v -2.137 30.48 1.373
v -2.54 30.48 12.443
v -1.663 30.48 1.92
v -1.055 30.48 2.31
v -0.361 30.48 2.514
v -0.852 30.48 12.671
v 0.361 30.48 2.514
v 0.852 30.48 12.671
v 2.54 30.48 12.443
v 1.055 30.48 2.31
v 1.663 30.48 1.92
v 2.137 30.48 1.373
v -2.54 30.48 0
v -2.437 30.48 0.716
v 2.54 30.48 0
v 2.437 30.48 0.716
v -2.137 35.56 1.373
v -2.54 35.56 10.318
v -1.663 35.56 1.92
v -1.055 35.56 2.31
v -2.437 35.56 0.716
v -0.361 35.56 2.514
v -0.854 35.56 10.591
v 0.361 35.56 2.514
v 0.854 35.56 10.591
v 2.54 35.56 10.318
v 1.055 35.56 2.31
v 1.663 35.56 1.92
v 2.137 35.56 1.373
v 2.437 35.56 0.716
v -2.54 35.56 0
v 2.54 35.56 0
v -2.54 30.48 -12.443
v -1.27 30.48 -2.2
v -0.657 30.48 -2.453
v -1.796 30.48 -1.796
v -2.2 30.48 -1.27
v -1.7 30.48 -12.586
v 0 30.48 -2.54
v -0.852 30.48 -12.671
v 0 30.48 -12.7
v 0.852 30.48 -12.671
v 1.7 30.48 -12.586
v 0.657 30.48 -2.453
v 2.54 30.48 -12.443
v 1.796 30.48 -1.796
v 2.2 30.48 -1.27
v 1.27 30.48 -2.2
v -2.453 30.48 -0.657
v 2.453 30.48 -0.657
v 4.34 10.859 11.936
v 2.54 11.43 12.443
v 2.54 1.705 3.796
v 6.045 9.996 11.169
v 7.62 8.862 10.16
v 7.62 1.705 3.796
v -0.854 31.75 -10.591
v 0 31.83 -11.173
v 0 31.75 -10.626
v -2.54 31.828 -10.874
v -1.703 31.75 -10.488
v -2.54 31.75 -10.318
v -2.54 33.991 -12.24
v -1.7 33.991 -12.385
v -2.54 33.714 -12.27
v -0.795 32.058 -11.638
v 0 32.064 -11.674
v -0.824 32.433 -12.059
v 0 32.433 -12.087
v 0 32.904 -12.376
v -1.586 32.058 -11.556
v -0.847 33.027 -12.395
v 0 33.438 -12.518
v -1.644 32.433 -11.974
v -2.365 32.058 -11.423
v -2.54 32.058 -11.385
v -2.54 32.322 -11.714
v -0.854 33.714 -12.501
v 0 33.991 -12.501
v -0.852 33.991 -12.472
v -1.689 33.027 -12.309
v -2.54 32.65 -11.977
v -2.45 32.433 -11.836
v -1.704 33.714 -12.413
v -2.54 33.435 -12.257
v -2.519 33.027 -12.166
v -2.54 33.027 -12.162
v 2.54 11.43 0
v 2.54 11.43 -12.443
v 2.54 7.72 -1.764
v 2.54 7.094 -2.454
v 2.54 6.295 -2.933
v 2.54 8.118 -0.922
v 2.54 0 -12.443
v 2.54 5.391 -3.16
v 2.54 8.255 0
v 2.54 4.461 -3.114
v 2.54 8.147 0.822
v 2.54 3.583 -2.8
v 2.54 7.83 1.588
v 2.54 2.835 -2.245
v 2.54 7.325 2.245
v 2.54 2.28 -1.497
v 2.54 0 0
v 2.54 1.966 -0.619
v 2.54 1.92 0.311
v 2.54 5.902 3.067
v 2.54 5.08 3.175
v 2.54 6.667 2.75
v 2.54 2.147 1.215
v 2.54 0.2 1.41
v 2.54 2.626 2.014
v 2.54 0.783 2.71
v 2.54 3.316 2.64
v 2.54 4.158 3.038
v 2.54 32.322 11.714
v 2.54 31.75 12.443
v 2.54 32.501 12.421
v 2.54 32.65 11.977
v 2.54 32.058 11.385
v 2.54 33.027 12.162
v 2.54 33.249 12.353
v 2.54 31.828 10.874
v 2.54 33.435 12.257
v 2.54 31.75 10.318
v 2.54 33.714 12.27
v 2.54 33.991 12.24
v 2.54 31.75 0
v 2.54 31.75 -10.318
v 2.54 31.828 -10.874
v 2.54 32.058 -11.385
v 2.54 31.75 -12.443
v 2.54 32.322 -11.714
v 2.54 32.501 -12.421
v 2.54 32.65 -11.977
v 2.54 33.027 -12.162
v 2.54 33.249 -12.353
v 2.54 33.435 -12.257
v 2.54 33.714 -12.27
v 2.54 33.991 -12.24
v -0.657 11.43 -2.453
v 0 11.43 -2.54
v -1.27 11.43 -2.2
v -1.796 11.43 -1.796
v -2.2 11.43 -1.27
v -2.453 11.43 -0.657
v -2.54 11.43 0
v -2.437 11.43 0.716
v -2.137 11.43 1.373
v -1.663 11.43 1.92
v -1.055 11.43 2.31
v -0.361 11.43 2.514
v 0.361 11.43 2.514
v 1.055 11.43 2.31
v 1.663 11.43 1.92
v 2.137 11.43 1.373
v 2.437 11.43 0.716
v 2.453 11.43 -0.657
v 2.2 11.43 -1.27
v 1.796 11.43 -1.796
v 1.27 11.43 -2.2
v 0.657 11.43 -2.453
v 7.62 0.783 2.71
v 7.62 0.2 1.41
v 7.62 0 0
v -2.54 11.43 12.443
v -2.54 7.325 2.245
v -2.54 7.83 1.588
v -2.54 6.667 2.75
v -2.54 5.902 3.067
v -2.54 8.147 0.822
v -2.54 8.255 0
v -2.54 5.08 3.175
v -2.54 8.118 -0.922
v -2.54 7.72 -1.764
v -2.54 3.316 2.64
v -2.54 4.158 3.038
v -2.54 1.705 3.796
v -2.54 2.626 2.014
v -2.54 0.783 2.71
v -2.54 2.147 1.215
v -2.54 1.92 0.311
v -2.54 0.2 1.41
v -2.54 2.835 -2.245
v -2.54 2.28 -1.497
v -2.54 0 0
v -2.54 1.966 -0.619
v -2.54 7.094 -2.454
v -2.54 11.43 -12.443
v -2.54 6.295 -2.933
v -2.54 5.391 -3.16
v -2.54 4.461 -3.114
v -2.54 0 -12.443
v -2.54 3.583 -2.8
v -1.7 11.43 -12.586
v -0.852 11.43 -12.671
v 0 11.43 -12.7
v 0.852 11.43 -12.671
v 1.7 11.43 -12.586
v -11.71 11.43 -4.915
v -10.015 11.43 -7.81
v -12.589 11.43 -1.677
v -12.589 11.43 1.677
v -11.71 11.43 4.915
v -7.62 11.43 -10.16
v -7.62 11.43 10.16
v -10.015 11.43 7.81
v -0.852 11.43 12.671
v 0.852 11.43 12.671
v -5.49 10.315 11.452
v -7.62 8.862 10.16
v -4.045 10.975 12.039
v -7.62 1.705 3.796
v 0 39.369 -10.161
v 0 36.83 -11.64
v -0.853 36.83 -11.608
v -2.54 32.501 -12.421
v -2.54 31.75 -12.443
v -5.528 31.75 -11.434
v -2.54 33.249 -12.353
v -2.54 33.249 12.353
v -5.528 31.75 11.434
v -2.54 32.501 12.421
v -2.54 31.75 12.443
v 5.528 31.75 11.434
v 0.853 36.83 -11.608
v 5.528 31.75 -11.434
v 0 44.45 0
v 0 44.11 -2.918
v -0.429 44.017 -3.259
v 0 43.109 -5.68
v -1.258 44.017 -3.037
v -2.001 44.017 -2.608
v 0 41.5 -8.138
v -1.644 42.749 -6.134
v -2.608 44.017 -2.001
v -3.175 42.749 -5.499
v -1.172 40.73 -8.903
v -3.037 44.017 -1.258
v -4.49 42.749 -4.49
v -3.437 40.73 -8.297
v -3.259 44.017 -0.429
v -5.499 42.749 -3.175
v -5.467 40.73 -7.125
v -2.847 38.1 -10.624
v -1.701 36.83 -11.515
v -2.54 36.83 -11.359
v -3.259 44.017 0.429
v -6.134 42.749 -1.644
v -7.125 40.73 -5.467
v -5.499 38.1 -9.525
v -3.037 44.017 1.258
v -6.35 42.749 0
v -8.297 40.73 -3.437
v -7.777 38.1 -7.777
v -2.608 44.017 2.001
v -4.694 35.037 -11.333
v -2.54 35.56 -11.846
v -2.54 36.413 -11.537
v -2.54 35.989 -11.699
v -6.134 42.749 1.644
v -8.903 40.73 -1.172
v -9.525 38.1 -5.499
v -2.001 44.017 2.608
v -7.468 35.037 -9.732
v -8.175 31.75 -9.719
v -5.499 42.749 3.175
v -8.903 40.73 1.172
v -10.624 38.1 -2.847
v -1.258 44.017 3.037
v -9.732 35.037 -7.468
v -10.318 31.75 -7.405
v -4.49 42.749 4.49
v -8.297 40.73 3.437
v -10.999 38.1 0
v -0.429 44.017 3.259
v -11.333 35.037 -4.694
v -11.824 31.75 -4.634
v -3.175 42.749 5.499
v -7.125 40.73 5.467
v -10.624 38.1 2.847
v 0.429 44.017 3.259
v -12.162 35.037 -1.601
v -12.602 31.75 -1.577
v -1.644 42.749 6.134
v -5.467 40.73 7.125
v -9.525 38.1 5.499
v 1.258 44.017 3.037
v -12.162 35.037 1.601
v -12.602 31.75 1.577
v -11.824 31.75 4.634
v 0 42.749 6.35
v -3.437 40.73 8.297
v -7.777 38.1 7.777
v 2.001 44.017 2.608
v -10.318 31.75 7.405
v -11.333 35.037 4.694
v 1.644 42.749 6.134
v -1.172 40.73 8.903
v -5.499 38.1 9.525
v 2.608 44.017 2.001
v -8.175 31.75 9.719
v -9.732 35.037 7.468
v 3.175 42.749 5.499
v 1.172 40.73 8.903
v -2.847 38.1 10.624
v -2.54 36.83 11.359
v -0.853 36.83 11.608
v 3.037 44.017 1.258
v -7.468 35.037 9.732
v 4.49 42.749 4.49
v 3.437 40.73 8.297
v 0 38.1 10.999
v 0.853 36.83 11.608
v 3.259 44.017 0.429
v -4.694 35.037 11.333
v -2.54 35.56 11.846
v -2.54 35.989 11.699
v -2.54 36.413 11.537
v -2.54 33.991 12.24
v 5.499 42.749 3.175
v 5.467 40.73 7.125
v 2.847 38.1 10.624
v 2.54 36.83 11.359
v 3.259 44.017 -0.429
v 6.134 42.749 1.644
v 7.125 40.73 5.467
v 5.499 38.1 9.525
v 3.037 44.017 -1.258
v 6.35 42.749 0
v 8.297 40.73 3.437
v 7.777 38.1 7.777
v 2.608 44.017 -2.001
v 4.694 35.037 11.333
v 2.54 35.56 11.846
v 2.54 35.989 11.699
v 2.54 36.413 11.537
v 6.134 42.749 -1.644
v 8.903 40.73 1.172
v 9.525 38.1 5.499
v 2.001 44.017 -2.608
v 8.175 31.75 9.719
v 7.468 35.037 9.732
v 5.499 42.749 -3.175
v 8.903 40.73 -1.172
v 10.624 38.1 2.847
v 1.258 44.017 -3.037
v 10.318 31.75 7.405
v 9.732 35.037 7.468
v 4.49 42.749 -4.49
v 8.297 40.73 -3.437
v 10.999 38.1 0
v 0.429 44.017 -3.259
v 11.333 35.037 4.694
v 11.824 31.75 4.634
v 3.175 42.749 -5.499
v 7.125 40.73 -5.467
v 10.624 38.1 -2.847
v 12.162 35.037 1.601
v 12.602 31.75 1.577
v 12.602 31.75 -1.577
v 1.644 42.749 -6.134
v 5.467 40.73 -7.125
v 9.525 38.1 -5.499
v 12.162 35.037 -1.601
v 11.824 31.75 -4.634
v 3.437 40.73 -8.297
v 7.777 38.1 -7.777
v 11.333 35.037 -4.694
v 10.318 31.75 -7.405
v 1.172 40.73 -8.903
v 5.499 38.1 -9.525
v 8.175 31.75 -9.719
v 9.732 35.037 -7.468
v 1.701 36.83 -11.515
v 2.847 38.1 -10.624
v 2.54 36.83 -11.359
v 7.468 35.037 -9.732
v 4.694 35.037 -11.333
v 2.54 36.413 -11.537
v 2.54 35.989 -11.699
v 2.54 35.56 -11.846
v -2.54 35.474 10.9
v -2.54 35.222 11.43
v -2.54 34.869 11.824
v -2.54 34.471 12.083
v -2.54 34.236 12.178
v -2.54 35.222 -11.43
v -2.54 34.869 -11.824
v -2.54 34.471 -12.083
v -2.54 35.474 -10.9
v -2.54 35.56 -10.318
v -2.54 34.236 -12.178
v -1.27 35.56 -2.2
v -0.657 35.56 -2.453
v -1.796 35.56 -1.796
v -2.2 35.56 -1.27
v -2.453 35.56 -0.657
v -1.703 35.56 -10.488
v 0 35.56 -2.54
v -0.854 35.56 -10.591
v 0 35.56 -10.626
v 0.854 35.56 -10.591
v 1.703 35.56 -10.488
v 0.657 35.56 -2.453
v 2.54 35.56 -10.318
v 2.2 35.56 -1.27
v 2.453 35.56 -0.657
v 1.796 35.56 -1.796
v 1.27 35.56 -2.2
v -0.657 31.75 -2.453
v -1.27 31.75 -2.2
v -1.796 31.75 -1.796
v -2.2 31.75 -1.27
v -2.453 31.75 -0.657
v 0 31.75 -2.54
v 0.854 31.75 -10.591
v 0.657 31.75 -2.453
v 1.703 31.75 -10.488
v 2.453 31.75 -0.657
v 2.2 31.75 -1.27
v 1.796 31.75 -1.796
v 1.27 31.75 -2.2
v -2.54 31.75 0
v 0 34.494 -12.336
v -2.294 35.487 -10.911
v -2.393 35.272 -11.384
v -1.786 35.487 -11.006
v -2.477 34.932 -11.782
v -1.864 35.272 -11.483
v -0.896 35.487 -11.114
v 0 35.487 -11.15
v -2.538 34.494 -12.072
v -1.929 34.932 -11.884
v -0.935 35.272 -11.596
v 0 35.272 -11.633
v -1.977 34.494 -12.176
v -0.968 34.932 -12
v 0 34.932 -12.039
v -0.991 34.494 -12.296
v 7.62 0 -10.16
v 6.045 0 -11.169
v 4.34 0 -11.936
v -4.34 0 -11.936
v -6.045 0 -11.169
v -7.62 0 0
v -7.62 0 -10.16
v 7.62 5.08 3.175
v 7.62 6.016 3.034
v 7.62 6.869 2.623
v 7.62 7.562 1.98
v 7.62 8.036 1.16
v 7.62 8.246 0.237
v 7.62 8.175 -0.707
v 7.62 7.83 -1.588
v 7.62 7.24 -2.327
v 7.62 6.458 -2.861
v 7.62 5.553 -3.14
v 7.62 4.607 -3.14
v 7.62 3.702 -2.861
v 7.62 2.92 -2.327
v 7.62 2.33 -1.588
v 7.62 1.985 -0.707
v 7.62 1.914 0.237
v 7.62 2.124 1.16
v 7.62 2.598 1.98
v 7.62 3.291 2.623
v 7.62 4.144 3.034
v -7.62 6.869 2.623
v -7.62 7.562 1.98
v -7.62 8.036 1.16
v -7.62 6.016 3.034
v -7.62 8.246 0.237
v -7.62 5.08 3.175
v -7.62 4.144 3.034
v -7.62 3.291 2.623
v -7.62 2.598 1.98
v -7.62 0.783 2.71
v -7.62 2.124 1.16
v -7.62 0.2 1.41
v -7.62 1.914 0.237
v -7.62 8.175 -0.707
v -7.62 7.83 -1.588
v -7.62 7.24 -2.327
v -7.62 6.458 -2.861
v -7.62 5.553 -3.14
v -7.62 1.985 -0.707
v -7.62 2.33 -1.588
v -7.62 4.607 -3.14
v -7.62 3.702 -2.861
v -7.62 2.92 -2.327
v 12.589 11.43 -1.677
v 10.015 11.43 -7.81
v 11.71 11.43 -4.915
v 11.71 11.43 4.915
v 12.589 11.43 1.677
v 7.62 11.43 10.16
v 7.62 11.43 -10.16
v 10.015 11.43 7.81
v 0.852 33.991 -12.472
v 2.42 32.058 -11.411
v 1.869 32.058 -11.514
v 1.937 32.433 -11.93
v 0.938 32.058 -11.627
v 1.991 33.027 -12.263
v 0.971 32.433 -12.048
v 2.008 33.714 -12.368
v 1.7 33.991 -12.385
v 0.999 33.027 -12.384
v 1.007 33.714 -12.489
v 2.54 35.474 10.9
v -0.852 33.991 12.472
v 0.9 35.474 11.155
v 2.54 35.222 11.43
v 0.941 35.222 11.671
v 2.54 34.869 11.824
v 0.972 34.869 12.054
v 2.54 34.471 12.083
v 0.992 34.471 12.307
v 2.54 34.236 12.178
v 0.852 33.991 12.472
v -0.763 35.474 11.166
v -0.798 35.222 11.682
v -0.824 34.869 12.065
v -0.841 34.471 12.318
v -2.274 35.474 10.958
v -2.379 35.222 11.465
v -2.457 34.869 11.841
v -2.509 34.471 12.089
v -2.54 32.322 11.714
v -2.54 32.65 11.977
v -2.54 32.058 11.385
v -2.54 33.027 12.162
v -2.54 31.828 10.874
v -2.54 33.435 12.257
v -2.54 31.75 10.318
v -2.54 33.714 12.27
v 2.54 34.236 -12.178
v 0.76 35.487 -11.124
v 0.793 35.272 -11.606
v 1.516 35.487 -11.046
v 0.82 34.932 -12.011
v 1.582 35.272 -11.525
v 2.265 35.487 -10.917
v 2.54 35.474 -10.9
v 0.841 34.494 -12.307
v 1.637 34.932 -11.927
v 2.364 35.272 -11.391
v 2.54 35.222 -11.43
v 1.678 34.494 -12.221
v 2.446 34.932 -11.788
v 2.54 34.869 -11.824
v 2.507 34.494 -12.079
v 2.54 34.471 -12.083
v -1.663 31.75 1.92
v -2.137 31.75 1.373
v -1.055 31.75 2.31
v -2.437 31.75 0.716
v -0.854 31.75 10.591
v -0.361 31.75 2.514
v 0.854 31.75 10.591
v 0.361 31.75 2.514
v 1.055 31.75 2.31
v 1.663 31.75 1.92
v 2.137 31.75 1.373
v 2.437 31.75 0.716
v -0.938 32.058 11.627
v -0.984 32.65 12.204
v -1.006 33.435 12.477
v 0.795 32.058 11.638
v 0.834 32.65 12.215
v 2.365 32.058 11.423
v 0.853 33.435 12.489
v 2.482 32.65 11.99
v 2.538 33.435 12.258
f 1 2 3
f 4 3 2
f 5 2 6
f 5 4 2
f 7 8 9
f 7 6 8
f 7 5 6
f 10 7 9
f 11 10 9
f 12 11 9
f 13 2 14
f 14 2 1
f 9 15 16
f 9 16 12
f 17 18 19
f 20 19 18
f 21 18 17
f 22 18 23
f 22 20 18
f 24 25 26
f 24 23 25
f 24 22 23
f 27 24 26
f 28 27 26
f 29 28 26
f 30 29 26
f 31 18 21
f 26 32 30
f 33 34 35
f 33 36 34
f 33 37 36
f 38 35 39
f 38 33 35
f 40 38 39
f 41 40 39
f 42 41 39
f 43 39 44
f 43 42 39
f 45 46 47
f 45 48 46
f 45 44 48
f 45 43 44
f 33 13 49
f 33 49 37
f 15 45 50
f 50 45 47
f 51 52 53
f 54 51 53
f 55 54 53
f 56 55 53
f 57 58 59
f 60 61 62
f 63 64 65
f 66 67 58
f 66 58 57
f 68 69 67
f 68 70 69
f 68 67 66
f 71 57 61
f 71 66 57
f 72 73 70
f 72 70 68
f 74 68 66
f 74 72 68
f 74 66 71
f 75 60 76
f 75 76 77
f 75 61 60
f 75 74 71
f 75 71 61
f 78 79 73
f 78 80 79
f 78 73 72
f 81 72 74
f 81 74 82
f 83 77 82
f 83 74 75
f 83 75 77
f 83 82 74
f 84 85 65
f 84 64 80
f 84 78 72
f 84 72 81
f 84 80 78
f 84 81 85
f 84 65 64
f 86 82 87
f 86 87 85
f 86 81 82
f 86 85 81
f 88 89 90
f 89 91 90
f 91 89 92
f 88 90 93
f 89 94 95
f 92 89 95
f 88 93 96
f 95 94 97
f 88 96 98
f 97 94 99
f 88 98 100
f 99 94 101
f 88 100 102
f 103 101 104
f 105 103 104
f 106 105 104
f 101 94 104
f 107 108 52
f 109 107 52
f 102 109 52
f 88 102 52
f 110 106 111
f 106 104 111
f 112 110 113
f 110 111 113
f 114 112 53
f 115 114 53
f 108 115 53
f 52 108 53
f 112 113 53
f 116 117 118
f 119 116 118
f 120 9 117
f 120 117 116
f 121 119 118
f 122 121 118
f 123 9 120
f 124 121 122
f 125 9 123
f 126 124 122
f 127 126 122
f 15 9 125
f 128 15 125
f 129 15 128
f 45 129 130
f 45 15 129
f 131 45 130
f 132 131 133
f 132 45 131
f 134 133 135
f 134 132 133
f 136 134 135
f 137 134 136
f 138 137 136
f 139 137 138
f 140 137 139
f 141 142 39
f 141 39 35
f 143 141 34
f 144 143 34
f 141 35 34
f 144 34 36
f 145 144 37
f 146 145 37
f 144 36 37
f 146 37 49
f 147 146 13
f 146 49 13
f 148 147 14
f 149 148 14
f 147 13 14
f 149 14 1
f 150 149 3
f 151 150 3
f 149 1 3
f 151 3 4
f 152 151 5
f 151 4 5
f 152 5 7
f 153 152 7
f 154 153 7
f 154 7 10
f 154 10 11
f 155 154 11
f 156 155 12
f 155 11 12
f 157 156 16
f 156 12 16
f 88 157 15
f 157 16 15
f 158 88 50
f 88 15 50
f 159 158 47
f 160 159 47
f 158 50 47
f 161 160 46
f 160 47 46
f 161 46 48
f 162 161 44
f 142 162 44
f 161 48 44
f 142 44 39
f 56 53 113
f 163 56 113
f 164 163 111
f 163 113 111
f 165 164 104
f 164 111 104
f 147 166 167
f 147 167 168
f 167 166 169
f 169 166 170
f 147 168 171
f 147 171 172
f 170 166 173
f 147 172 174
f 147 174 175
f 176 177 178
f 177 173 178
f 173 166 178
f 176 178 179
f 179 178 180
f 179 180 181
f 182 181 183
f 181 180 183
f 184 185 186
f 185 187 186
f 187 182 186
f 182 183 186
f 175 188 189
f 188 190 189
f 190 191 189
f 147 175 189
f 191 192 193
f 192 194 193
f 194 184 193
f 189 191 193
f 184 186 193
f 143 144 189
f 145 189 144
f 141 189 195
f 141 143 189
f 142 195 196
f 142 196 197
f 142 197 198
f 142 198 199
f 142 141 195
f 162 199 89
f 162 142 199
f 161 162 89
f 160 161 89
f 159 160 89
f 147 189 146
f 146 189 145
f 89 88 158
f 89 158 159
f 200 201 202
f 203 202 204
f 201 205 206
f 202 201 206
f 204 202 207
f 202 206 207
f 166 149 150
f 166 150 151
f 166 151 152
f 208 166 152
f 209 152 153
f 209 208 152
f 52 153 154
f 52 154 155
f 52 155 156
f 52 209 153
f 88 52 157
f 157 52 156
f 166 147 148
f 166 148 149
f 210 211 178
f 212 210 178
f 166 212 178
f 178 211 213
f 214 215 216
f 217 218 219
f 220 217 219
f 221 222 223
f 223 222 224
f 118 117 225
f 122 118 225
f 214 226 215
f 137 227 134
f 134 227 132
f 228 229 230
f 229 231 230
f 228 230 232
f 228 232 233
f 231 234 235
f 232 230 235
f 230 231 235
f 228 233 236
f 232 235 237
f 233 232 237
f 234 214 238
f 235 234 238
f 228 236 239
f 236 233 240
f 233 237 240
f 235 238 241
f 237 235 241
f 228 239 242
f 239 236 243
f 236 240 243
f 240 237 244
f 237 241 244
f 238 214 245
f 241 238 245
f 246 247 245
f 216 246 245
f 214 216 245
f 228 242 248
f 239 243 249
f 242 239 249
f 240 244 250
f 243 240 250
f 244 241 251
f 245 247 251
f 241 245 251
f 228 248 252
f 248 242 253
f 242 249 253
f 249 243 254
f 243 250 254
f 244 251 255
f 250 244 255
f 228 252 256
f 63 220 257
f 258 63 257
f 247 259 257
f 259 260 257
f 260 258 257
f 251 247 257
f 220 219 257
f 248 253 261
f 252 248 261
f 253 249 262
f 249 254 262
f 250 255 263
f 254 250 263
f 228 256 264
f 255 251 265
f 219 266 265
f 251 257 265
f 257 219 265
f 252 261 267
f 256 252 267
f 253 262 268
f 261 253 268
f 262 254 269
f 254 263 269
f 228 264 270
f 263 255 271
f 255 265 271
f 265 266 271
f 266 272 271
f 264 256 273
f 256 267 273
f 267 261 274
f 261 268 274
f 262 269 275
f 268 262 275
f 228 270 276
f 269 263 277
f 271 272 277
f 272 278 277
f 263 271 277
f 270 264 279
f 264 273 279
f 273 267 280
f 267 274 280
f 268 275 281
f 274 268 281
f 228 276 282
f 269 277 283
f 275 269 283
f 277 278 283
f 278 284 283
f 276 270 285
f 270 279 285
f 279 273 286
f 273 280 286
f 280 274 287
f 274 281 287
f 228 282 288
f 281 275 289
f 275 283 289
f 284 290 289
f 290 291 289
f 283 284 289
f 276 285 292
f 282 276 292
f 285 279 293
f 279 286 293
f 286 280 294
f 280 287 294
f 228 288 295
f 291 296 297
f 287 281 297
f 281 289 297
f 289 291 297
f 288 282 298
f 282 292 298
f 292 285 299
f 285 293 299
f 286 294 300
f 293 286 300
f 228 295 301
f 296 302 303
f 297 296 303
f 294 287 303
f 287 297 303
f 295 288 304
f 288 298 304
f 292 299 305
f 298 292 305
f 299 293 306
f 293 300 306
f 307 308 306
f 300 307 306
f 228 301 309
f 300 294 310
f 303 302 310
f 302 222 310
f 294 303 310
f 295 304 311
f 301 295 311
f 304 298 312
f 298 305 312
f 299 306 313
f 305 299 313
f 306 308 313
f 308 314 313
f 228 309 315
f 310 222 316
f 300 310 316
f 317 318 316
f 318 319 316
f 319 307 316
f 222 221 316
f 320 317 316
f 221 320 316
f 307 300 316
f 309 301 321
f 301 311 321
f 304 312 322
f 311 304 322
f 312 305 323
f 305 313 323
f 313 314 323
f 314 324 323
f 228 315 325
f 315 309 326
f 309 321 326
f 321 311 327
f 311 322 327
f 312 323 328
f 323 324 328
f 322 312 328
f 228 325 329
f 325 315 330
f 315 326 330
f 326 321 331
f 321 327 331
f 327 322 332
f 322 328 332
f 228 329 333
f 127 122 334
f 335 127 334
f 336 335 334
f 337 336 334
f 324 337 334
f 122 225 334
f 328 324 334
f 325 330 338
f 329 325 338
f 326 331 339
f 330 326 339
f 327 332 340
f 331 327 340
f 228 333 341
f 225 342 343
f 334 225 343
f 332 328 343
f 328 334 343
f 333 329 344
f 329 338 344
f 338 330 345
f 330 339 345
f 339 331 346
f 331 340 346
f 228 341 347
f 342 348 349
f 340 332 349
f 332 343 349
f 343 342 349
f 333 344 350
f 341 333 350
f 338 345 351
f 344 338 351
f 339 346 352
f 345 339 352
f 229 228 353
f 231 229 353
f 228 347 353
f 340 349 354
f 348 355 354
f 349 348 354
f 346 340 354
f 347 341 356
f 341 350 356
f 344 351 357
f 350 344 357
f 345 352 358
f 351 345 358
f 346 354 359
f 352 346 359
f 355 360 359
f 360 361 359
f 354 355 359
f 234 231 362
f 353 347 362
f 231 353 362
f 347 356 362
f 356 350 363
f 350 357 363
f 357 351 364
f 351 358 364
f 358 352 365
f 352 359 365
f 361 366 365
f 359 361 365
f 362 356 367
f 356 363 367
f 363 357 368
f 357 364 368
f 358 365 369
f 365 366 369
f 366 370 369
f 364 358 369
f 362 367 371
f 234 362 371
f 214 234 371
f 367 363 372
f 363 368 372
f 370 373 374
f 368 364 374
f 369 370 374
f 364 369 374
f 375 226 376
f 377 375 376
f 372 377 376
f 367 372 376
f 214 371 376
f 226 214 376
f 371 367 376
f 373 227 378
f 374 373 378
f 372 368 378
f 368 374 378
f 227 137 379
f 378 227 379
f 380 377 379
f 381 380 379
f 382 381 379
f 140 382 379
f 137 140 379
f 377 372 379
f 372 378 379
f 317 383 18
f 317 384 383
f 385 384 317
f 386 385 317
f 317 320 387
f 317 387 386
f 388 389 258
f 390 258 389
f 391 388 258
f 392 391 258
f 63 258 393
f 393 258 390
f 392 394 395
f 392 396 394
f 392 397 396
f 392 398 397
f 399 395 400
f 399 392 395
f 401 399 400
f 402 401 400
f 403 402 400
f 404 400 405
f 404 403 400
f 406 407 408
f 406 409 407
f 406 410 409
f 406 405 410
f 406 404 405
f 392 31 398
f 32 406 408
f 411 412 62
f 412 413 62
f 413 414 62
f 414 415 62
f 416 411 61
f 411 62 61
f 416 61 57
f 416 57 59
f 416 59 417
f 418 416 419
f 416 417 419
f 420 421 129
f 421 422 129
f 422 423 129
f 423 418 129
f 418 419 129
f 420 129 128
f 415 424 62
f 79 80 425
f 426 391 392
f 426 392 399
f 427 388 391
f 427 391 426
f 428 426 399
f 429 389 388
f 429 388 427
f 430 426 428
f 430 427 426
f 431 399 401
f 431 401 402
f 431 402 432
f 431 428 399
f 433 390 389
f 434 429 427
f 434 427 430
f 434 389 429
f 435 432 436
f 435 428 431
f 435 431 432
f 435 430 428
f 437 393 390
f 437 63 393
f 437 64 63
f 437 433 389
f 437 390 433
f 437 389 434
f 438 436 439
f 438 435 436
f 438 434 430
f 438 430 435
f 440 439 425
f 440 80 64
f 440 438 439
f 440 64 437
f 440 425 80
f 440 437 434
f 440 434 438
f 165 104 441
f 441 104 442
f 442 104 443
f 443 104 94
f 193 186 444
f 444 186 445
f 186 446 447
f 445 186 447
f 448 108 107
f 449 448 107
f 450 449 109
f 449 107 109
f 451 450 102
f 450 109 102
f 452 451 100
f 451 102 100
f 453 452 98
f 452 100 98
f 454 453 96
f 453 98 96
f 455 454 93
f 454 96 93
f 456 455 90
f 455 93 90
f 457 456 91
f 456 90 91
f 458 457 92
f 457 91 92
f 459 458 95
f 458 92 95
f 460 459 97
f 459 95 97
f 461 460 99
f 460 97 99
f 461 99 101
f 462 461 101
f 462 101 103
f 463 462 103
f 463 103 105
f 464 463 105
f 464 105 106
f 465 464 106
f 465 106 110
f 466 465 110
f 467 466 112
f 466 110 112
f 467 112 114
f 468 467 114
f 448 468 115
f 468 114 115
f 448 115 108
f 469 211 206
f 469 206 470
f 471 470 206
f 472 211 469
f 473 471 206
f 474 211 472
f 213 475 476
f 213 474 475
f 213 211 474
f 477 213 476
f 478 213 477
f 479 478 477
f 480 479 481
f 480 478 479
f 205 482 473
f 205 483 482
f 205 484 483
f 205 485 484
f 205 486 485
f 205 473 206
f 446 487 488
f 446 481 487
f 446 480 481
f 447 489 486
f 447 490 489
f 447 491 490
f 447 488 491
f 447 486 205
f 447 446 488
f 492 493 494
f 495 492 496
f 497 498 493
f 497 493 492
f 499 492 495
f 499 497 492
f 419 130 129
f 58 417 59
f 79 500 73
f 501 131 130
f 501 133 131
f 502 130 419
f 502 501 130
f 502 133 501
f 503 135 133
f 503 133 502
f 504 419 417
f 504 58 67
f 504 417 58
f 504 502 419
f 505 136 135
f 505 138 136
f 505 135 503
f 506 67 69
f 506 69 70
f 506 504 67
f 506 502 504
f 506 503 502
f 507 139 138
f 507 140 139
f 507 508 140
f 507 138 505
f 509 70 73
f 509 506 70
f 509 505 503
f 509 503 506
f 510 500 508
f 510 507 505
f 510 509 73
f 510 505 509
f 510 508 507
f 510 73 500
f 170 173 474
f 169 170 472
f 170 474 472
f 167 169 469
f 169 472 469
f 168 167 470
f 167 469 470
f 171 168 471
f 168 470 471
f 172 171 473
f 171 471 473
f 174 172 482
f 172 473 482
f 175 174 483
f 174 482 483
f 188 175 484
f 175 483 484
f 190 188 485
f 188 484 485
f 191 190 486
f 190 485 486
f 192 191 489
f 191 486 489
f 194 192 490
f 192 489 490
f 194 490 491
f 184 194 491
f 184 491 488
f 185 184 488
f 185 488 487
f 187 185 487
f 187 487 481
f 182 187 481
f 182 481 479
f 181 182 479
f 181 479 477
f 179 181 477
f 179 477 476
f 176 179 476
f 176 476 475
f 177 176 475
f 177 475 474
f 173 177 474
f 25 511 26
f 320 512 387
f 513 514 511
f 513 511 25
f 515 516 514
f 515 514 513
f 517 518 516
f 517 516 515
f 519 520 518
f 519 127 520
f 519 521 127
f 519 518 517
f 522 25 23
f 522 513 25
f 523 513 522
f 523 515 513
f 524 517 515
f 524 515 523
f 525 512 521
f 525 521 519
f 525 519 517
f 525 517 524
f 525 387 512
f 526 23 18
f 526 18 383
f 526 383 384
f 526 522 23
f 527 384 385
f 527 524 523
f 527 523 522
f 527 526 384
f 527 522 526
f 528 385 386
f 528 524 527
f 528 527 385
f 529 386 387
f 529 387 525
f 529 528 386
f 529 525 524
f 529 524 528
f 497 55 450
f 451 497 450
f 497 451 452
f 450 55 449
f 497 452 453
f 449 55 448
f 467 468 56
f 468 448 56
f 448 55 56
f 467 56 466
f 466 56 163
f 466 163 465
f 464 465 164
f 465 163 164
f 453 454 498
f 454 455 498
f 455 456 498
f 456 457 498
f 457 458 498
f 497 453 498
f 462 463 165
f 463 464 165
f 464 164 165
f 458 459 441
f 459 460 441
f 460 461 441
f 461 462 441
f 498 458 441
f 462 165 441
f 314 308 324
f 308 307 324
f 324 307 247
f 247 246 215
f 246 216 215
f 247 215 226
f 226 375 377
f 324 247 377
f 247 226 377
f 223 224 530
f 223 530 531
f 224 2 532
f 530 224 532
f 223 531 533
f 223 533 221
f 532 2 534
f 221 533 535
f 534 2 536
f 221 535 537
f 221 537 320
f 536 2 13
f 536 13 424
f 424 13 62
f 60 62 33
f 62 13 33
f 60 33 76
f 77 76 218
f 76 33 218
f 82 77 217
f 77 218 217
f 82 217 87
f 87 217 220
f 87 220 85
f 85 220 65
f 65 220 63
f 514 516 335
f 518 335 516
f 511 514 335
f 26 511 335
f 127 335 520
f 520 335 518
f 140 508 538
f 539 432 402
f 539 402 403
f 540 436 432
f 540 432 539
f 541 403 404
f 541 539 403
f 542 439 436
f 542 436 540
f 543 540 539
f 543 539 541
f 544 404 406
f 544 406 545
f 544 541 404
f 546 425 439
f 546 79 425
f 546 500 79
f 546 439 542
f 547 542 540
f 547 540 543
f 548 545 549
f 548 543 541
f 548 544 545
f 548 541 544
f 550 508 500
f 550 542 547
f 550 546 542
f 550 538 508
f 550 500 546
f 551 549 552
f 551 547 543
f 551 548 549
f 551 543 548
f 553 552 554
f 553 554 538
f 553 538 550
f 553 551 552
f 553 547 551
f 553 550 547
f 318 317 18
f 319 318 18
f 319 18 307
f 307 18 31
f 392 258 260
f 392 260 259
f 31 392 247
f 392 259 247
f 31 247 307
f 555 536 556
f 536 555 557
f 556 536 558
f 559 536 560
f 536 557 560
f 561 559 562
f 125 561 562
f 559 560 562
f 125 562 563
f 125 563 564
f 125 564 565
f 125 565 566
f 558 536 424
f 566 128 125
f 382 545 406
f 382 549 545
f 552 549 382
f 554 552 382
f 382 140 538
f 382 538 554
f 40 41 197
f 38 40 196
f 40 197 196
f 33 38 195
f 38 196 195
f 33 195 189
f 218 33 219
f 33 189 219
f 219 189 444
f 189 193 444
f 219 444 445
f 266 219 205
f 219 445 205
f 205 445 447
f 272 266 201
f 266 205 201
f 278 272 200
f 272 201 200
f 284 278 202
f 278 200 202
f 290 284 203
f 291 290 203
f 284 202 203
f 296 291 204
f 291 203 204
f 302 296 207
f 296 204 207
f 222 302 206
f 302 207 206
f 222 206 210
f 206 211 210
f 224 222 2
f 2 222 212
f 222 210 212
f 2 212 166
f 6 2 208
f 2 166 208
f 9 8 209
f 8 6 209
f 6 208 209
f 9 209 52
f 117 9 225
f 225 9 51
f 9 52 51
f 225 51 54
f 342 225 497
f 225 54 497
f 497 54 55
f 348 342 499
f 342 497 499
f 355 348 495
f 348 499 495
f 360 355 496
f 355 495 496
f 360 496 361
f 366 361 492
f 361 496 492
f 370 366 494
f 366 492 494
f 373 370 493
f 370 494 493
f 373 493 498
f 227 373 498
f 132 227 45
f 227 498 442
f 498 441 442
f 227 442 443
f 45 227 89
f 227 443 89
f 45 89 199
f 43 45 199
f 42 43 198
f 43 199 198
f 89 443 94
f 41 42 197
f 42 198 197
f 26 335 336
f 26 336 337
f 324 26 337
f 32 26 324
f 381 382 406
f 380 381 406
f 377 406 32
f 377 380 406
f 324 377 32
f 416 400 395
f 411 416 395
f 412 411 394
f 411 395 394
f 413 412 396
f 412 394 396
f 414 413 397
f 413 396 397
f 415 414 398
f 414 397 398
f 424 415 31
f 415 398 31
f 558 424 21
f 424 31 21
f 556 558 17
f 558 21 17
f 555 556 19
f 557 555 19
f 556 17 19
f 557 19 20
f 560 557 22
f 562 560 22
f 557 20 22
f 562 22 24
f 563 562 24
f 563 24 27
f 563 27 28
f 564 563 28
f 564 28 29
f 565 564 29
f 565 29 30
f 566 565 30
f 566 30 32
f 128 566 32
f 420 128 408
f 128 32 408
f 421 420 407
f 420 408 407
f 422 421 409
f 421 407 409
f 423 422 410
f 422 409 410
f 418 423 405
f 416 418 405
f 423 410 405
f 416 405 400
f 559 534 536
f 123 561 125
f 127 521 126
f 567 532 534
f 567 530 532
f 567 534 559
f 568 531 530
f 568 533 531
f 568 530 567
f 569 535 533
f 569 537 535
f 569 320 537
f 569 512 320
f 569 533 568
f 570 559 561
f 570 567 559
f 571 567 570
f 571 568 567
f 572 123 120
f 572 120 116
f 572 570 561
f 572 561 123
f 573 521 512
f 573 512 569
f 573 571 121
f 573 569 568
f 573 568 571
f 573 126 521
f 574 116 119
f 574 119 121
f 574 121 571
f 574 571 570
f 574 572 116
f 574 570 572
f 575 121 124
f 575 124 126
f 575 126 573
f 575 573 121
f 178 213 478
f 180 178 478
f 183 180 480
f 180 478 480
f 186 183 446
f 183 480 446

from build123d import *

# Parameters (mm, degrees)
CUT_EXTRUDE1_DEPTH      = 11.43
SKETCH3_R               = 3.175
CUT_EXTRUDE2_DEPTH      = 51.497474194
CUT_EXTRUDE3_DEPTH      = 48.941448664
CUT_EXTRUDE3_DEPTH_BACK = 48.941448664
SKETCH4_W               = 5.08
SKETCH4_H               = 1.27
FILLET1_R               = 1.905


with BuildPart() as part:
    # Sketch1 → Revolve1 (revolve)
    with BuildSketch(Plane.XY, mode=Mode.PRIVATE) as revolve1_sk:
        with BuildLine():
            Line((0, 0), (0, 5.602635041))
            Line((0, 5.602635041), (-2.54, 5.602635041))
            Line((-2.54, 5.602635041), (-2.54, 36.83))
            Line((-2.54, 36.83), (0, 36.83))
            Line((0, 36.83), (0, 44.45))
            ThreePointArc((0, 44.45), (-8.980256121, 40.730256121), (-12.7, 31.75))
            Line((-12.7, 31.75), (-12.7, 0))
            Line((-12.7, 0), (0, 0))
        make_face()
    revolve(revolve1_sk.sketch.rotate(Axis((0, 0, 0), (0, 1, 0)), 270), axis=Axis((0, 0, 0), (0, 1, 0)))

    # Sketch2 → Cut-Extrude1 (cut)
    with BuildSketch(Plane.XZ):
        with BuildLine():
            Line((-2.54, 12.443407893), (-2.54, -12.443407893))
            ThreePointArc((-2.54, -12.443407893), (0, -12.7), (2.54, -12.443407893))
            Line((2.54, -12.443407893), (2.54, 12.443407893))
            ThreePointArc((2.54, 12.443407893), (0, 12.7), (-2.54, 12.443407893))
        make_face()
        with BuildLine():
            Line((-7.62, 10.16), (-7.62, -10.16))
            ThreePointArc((-7.62, -10.16), (-12.7, 0), (-7.62, 10.16))
        make_face()
        with BuildLine():
            Line((7.62, 10.16), (7.62, -10.16))
            ThreePointArc((7.62, -10.16), (12.7, 0), (7.62, 10.16))
        make_face()
    extrude(amount=-CUT_EXTRUDE1_DEPTH, mode=Mode.SUBTRACT)

    # Sketch3 → Cut-Extrude2 (cut, through all)
    with BuildSketch(Plane.ZY.offset(7.62)):
        with Locations((0, 5.08)):
            Circle(SKETCH3_R)
        with BuildLine():
            Line((0, 0), (12.443407893, 0))
            Line((12.443407893, 0), (12.443407893, 11.43))
            Line((12.443407893, 11.43), (3.796422114, 1.704562379))
            ThreePointArc((3.796422114, 1.704562379), (2.080766311, 0.445691901), (0, 0))
        make_face()
    extrude(amount=-CUT_EXTRUDE2_DEPTH, mode=Mode.SUBTRACT)

    # Sketch4 → Cut-Extrude3 (cut, two sides: drawn at the far end of the back side and taken through both)
    with BuildSketch(Plane.XY.offset(-CUT_EXTRUDE3_DEPTH_BACK)):
        with Locations((0, 31.115)):
            Rectangle(SKETCH4_W, SKETCH4_H)
        with Locations((0, 36.195)):
            Rectangle(SKETCH4_W, SKETCH4_H)
    extrude(amount=CUT_EXTRUDE3_DEPTH + CUT_EXTRUDE3_DEPTH_BACK, mode=Mode.SUBTRACT)

    # Fillet1
    # the kernel refuses this fillet: 1.905 mm, written as the material it takes off along each edge
    with BuildSketch(Plane(origin=(0, 31.75, 0), x_dir=(-0.6006287696946434, 0, 0.7995280364159214), z_dir=(-0.7995280364159214, 0, -0.6006287696946434))) as fillet1_piece_1_section:
        with BuildLine():
            CenterArc((10.625582337, 1.905), FILLET1_R, 270, 100.164248622)
            Line((10.625582337, 0), (12.7, 0))
            ThreePointArc((12.7, 0), (12.650073138, 1.125010933), (12.500685102, 2.241176471))
        make_face()
    fillet1_piece_1 = revolve(axis=Axis((0, 31.75, 0), (0, 1, 0)), revolution_arc=73.829886486, mode=Mode.PRIVATE)
    fillet1_piece_1 = split(fillet1_piece_1, bisect_by=Plane(origin=(-2.54, 32.266908465, 12.1243087), z_dir=(1, 0, 0)), keep=Keep.TOP, mode=Mode.PRIVATE)
    fillet1_piece_1 = split(fillet1_piece_1, bisect_by=Plane(origin=(2.54, 32.266908465, 12.1243087), z_dir=(-1, 0, 0)), keep=Keep.TOP, mode=Mode.PRIVATE)
    add(fillet1_piece_1, mode=Mode.SUBTRACT)
    with BuildSketch(Plane(origin=(0, 35.56, 0), x_dir=(0.5180820301307622, 0, 0.8553309359865267), z_dir=(0.8553309359865267, 0, -0.5180820301307622))) as fillet1_piece_2_section:
        with BuildLine():
            CenterArc((10.625582337, 1.905), FILLET1_R, 270, 79.835751378)
            Line((10.625582337, 0), (12.115027858, 0))
            ThreePointArc((12.115027858, 0), (12.332827452, 0.778273257), (12.500685102, 1.568823529))
        make_face()
    fillet1_piece_2 = revolve(axis=Axis((0, 35.56, 0), (0, -1, 0)), revolution_arc=62.407371172, mode=Mode.PRIVATE)
    fillet1_piece_2 = split(fillet1_piece_2, bisect_by=Plane(origin=(-2.54, 35.21222625, 11.799196002), z_dir=(1, 0, 0)), keep=Keep.TOP, mode=Mode.PRIVATE)
    fillet1_piece_2 = split(fillet1_piece_2, bisect_by=Plane(origin=(2.54, 35.21222625, 11.799196002), z_dir=(-1, 0, 0)), keep=Keep.TOP, mode=Mode.PRIVATE)
    add(fillet1_piece_2, mode=Mode.SUBTRACT)
    with BuildSketch(Plane(origin=(0, 35.56, 0), x_dir=(0, 0, -1), z_dir=(-1, 0, 0))) as fillet1_piece_3_section:
        with BuildLine():
            CenterArc((10.625582337, 1.905), FILLET1_R, 270, 79.835751378)
            Line((10.625582337, 0), (12.115027858, 0))
            ThreePointArc((12.115027858, 0), (12.332827452, 0.778273257), (12.500685102, 1.568823529))
        make_face()
    fillet1_piece_3 = revolve(axis=Axis((0, 35.56, 0), (0, -1, 0)), revolution_arc=31.203269463, mode=Mode.PRIVATE)
    fillet1_piece_3 = split(fillet1_piece_3, bisect_by=Plane(origin=(2.54, 35.212226268, -11.799195909), z_dir=(-1, 0, 0)), keep=Keep.TOP, mode=Mode.PRIVATE)
    add(fillet1_piece_3, mode=Mode.SUBTRACT)
    with BuildSketch(Plane(origin=(0, 31.75, 0), x_dir=(0, 0, -1), z_dir=(1, 0, 0))) as fillet1_piece_4_section:
        with BuildLine():
            CenterArc((10.625582337, 1.905), FILLET1_R, 270, 100.164248622)
            Line((10.625582337, 0), (12.7, 0))
            ThreePointArc((12.7, 0), (12.650073138, 1.125010933), (12.500685102, 2.241176471))
        make_face()
    fillet1_piece_4 = revolve(axis=Axis((0, 31.75, 0), (0, 1, 0)), revolution_arc=36.914440828, mode=Mode.PRIVATE)
    fillet1_piece_4 = split(fillet1_piece_4, bisect_by=Plane(origin=(-2.54, 32.26690841, -12.124308672), z_dir=(1, 0, 0)), keep=Keep.TOP, mode=Mode.PRIVATE)
    add(fillet1_piece_4, mode=Mode.SUBTRACT)
    with BuildSketch(Plane(origin=(0, 31.75, 0), x_dir=(0.6006217587640484, 0, -0.799533303183289), z_dir=(0.799533303183289, 0, 0.6006217587640484))) as fillet1_piece_5_section:
        with BuildLine():
            CenterArc((10.625582337, 1.905), FILLET1_R, 270, 100.164248622)
            Line((10.625582337, 0), (12.7, 0))
            ThreePointArc((12.7, 0), (12.650073138, 1.125010933), (12.500685102, 2.241176471))
        make_face()
    fillet1_piece_5 = revolve(axis=Axis((0, 31.75, 0), (0, 1, 0)), revolution_arc=36.914440828, mode=Mode.PRIVATE)
    fillet1_piece_5 = split(fillet1_piece_5, bisect_by=Plane(origin=(2.54, 32.266908503, -12.124308915), z_dir=(-1, 0, 0)), keep=Keep.TOP, mode=Mode.PRIVATE)
    add(fillet1_piece_5, mode=Mode.SUBTRACT)
    with BuildSketch(Plane(origin=(0, 35.56, 0), x_dir=(-0.5180758180945625, 0, -0.8553346986447177), z_dir=(-0.8553346986447177, 0, 0.5180758180945625))) as fillet1_piece_6_section:
        with BuildLine():
            CenterArc((10.625582337, 1.905), FILLET1_R, 270, 79.835751378)
            Line((10.625582337, 0), (12.115027858, 0))
            ThreePointArc((12.115027858, 0), (12.332827452, 0.778273257), (12.500685102, 1.568823529))
        make_face()
    fillet1_piece_6 = revolve(axis=Axis((0, 35.56, 0), (0, -1, 0)), revolution_arc=31.203269463, mode=Mode.PRIVATE)
    fillet1_piece_6 = split(fillet1_piece_6, bisect_by=Plane(origin=(-2.54, 35.212226169, -11.799196271), z_dir=(1, 0, 0)), keep=Keep.TOP, mode=Mode.PRIVATE)
    add(fillet1_piece_6, mode=Mode.SUBTRACT)


solid = part.part
